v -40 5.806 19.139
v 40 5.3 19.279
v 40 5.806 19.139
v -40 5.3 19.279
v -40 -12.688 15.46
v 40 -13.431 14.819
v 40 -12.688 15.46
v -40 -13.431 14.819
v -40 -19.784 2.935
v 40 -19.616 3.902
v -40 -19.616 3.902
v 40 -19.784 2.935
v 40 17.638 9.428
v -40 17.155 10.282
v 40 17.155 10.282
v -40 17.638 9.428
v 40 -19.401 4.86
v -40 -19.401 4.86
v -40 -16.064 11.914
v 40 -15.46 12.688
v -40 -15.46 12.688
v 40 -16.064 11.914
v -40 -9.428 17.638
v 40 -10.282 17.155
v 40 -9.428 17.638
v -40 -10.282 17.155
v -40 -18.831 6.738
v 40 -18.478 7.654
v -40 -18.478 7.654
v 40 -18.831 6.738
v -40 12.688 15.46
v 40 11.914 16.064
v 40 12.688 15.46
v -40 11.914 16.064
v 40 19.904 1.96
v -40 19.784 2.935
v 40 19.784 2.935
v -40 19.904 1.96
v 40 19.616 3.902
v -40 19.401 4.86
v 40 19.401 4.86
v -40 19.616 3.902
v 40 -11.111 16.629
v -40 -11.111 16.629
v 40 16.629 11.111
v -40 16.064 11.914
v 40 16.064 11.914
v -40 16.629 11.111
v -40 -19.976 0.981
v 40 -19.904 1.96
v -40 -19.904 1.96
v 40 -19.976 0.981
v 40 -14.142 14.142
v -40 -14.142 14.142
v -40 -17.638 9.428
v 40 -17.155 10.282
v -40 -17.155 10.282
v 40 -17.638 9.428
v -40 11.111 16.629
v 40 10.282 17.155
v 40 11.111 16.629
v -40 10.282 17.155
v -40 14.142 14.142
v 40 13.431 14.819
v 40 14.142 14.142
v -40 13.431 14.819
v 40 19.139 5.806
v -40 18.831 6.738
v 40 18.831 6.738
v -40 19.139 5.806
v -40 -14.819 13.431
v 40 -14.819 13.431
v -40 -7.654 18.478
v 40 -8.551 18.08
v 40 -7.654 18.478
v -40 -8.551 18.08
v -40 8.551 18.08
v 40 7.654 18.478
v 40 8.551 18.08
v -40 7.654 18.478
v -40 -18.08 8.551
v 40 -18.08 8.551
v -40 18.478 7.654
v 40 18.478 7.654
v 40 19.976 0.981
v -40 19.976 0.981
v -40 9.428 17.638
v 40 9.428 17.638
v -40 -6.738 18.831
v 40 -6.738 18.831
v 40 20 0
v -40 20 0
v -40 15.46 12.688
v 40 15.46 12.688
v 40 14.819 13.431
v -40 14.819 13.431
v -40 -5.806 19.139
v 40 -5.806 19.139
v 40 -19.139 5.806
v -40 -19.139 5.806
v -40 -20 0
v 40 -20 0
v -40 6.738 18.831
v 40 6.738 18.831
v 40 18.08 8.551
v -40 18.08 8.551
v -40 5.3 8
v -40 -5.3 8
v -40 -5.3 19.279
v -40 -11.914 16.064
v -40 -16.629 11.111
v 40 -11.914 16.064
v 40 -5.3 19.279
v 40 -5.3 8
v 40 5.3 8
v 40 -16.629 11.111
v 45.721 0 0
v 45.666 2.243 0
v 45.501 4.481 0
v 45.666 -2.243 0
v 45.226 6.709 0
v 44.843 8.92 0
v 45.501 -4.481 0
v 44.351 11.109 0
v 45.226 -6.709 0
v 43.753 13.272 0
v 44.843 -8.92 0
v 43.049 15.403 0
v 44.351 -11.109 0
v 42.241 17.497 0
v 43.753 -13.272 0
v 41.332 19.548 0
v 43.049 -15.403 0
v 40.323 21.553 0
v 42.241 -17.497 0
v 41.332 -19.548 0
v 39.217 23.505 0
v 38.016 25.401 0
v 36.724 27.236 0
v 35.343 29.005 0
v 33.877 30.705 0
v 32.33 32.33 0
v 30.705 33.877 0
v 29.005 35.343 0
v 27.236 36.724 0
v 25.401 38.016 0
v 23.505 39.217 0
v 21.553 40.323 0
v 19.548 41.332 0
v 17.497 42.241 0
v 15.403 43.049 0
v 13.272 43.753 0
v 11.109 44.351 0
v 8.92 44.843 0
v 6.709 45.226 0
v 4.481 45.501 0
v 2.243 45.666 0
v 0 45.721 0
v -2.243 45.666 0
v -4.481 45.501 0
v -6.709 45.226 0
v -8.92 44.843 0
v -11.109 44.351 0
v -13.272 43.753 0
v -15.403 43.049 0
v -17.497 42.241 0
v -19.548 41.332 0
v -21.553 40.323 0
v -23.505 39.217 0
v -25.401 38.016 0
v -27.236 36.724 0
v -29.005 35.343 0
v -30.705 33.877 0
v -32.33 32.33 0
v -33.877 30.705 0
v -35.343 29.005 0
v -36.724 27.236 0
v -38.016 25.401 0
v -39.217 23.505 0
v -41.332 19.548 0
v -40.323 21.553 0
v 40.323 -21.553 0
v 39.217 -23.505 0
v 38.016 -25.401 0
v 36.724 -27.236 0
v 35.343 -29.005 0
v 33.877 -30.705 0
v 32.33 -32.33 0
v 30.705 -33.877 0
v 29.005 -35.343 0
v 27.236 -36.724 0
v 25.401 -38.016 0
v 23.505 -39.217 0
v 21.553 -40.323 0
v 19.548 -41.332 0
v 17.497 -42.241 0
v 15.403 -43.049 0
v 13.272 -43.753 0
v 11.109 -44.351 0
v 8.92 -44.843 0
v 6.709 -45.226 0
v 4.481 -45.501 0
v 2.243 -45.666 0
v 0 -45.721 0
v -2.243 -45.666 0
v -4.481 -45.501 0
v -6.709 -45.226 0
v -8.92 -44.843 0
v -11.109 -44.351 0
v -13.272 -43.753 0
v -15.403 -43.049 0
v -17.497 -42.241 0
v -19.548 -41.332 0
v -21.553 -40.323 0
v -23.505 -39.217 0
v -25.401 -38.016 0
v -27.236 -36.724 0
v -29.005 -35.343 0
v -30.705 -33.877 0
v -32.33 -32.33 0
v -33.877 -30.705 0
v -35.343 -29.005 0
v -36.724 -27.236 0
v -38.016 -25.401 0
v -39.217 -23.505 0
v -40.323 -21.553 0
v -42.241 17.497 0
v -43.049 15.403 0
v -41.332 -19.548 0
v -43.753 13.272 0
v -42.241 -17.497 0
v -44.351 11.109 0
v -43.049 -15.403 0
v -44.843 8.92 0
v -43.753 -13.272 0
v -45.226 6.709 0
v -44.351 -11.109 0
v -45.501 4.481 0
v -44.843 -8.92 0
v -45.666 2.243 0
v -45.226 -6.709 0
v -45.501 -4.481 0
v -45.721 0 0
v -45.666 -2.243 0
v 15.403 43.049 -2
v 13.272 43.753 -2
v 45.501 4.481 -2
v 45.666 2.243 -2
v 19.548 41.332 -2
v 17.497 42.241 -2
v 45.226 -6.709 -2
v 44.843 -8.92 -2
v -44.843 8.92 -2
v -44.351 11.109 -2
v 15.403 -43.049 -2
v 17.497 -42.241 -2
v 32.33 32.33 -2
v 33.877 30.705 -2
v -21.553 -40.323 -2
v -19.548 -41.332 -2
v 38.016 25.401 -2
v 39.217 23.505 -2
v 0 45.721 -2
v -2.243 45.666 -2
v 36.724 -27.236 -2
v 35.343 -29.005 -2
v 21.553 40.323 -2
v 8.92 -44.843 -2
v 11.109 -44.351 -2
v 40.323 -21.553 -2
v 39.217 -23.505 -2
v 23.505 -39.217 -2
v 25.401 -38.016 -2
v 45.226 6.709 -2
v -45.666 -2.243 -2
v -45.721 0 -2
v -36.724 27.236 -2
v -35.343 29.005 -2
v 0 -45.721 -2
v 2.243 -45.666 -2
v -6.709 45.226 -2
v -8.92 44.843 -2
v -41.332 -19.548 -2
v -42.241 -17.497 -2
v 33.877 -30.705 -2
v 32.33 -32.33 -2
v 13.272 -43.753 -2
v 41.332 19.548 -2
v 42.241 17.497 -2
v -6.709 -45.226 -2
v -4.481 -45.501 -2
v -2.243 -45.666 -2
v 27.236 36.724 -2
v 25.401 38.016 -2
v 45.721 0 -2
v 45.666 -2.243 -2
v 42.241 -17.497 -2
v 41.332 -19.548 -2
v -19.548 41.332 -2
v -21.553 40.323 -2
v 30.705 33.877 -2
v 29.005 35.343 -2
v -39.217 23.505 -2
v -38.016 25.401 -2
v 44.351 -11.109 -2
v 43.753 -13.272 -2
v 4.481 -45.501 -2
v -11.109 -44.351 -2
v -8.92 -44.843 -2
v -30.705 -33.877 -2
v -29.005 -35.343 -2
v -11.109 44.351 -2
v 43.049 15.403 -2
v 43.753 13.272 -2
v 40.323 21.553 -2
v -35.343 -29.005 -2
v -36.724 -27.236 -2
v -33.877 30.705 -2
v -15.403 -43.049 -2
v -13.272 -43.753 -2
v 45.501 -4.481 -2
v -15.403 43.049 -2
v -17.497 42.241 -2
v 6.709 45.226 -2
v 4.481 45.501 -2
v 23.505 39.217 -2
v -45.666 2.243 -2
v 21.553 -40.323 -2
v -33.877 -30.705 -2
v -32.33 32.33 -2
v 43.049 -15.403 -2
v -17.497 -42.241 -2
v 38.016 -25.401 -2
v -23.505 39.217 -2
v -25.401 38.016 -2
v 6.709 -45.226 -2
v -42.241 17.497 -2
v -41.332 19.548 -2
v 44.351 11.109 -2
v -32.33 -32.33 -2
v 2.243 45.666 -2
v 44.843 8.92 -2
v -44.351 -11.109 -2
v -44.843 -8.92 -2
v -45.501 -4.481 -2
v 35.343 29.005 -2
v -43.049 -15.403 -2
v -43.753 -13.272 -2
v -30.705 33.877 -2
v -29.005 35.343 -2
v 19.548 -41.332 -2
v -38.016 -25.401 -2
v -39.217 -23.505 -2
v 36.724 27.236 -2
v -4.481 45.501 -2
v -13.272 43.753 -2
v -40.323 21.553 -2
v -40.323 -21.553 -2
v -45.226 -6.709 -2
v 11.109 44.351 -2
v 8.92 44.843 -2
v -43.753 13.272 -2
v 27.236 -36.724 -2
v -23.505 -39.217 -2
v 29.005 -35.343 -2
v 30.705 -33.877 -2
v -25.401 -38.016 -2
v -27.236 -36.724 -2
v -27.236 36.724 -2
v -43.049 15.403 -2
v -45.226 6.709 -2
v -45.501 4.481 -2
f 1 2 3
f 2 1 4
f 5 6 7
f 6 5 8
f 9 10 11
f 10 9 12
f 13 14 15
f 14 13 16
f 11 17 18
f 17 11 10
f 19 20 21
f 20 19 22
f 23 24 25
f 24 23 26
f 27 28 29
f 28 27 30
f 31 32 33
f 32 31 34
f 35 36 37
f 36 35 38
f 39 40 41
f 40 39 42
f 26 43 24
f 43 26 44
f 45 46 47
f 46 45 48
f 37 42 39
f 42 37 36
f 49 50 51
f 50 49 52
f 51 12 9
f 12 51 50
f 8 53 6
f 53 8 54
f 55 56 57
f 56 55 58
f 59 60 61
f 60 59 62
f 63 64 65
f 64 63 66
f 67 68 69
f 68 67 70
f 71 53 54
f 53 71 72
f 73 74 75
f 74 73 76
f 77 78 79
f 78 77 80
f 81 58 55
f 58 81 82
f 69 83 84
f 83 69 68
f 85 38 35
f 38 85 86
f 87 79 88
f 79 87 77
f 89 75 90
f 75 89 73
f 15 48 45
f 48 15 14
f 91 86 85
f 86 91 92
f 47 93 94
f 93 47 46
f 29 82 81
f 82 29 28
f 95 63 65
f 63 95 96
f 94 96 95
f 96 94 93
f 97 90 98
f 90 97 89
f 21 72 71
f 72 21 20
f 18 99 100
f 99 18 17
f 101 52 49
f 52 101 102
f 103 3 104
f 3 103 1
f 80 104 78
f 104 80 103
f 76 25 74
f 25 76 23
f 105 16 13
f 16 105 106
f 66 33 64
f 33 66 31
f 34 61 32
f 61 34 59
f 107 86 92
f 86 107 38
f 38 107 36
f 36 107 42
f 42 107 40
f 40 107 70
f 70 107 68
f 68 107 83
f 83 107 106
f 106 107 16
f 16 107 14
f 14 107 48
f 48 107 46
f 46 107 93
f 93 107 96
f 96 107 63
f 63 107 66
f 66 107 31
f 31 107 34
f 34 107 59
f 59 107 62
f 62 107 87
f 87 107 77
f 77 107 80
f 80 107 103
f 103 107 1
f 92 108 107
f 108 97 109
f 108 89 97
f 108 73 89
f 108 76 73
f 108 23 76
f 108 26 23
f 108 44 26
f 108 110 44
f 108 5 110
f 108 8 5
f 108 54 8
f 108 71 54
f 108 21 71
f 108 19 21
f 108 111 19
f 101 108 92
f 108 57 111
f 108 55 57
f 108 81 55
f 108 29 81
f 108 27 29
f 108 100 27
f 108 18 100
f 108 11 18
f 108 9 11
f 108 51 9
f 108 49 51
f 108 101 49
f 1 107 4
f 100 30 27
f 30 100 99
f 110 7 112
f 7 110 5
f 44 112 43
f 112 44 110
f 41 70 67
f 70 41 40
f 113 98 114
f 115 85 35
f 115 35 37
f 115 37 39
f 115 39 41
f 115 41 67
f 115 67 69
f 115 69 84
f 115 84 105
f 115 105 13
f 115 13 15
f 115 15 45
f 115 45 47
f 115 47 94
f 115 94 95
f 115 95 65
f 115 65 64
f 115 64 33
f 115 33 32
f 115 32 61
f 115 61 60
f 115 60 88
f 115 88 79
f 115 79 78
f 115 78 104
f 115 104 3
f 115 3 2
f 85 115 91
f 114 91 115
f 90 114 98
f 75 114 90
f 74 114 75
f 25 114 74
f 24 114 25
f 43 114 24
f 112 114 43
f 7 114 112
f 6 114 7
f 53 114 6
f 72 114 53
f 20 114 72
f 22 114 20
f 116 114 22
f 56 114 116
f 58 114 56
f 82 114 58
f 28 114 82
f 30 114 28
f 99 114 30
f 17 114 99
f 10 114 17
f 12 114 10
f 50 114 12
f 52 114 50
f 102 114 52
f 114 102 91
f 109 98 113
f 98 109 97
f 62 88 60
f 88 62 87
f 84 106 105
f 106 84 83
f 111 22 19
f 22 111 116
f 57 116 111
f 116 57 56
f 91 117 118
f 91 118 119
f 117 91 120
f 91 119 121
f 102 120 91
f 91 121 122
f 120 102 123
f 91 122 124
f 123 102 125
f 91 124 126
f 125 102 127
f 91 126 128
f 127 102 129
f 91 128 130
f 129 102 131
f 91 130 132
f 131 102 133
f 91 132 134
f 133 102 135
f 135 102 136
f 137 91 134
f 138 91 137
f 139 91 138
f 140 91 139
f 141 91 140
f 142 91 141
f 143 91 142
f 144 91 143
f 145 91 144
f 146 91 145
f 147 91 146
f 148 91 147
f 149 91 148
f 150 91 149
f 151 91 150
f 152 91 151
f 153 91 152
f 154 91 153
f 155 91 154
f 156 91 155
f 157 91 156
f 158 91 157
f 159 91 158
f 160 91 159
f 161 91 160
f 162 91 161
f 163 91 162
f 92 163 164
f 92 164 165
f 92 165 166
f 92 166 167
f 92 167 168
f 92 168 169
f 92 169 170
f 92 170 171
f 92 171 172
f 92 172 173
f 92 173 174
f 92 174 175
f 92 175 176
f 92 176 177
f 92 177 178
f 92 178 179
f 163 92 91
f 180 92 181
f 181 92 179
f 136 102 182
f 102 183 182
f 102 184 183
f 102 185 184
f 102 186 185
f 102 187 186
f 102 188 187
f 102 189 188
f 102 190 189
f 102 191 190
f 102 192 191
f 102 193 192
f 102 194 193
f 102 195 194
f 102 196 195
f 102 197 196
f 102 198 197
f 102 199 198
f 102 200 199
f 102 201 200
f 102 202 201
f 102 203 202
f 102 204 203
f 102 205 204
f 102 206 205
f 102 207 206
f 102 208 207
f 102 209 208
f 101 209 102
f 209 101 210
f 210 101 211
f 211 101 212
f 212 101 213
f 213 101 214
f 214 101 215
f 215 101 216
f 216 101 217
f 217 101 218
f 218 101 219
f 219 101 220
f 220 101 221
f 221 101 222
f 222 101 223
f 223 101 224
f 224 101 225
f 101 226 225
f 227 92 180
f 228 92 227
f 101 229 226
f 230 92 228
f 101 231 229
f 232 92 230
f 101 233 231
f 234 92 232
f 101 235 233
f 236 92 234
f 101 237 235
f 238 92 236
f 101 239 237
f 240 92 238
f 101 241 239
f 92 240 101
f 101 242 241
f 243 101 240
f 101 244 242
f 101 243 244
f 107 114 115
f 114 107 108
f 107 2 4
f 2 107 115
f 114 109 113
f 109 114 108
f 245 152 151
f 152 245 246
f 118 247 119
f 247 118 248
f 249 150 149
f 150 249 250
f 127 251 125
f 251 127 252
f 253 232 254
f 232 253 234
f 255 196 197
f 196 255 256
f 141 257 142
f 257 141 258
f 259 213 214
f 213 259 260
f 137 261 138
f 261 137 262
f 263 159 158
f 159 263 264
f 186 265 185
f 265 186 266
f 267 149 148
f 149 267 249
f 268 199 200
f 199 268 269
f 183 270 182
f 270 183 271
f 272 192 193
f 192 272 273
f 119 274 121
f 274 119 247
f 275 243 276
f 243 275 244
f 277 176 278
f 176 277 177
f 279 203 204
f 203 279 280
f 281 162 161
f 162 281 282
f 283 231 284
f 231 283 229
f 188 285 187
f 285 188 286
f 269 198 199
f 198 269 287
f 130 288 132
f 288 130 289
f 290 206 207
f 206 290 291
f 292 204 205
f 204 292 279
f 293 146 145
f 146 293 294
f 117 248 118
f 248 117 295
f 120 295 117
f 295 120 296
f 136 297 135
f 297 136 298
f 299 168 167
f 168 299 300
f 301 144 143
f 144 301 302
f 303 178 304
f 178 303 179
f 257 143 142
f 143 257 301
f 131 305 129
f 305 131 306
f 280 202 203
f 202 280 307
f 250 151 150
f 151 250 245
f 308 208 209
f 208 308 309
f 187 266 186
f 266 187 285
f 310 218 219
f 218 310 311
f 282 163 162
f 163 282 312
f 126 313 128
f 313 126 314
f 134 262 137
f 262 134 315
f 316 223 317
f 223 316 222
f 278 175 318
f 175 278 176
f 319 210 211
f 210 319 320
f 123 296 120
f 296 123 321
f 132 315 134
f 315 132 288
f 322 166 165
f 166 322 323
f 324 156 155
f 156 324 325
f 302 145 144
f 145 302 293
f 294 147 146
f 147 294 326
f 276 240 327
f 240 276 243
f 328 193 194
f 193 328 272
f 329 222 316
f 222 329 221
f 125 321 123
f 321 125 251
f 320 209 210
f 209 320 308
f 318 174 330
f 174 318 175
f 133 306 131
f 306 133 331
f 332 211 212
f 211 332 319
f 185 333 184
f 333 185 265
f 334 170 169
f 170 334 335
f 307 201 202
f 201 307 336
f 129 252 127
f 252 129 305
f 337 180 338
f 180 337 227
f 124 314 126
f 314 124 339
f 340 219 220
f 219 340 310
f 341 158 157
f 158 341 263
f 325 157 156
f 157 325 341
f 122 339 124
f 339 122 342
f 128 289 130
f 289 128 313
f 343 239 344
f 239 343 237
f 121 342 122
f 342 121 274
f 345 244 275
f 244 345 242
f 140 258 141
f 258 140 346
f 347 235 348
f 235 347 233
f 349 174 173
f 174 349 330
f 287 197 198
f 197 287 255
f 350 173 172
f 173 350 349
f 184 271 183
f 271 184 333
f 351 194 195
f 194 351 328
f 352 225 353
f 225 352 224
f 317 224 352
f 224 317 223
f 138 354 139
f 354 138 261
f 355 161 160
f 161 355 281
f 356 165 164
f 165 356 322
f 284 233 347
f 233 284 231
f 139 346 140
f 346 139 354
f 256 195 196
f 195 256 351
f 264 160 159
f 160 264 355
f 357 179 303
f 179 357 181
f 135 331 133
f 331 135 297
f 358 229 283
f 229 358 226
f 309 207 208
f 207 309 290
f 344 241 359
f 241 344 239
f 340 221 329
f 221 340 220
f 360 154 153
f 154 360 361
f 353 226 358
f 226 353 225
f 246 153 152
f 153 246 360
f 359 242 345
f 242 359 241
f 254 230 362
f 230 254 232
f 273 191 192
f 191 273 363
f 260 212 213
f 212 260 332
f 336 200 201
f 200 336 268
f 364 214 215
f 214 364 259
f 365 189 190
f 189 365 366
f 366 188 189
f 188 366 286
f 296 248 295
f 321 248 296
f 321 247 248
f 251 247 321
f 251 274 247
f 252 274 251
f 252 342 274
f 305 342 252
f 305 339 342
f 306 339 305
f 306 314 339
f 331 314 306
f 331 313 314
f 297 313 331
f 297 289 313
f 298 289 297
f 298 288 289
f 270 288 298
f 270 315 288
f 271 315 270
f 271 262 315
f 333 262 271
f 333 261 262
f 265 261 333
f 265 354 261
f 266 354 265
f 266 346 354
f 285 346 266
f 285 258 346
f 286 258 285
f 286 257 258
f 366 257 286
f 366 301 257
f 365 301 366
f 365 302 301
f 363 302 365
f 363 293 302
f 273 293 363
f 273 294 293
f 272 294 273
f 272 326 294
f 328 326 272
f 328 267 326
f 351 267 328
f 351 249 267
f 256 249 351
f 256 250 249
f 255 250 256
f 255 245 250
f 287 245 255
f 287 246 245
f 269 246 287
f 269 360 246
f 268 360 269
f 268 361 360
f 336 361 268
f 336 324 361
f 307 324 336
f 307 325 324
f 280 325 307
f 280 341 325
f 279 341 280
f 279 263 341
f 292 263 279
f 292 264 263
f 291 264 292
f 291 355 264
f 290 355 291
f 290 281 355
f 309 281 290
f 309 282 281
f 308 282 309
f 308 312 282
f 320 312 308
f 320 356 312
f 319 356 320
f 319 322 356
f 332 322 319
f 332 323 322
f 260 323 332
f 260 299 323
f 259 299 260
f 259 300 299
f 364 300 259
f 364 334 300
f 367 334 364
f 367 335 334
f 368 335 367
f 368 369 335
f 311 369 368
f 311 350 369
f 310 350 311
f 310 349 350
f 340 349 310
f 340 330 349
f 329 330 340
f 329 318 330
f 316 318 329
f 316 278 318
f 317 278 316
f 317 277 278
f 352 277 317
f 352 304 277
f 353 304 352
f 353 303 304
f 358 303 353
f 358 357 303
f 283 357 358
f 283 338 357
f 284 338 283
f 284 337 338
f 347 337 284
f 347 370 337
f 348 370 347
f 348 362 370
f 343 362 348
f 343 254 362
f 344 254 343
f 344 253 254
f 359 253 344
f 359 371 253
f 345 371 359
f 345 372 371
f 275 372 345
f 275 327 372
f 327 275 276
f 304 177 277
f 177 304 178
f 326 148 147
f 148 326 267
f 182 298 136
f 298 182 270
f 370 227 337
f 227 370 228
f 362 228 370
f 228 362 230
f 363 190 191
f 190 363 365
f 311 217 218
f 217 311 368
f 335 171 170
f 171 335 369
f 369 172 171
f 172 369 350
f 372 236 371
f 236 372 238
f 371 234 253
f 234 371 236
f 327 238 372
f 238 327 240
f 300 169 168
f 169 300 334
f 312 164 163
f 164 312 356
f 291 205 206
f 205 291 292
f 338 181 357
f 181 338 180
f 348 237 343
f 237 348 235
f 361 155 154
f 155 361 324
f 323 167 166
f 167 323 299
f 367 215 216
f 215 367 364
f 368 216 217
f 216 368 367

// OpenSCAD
$fn = 128;

$lid_diameter = 80;
$lid_height = 10;

$holder_diameter = 40;
$holder_length = 80;

$base_height = 2;

$slot_clearance = 0.6;
$slot_depth = 12;

holder_radius = $holder_diameter / 2;
base_diameter = sqrt(($holder_length * $holder_length) + ($holder_diameter * $holder_diameter)) + 2;
slot_width = $lid_height + $slot_clearance;
slot_length = $holder_length + 2;

union() {
    translate([0, 0, -$base_height])
        cylinder(h = $base_height, d = base_diameter);

    difference() {
        intersection() {
            translate([-$holder_length / 2, 0, 0])
                rotate([0, 90, 0])
                    cylinder(h = $holder_length, r = holder_radius);

            translate([-$holder_length / 2, -holder_radius, 0])
                cube([$holder_length, $holder_diameter, holder_radius]);
        }

        translate([-$holder_length / 2 - 1, -slot_width / 2, holder_radius - $slot_depth])
            cube([slot_length, slot_width, $slot_depth + 1]);
    }
}
